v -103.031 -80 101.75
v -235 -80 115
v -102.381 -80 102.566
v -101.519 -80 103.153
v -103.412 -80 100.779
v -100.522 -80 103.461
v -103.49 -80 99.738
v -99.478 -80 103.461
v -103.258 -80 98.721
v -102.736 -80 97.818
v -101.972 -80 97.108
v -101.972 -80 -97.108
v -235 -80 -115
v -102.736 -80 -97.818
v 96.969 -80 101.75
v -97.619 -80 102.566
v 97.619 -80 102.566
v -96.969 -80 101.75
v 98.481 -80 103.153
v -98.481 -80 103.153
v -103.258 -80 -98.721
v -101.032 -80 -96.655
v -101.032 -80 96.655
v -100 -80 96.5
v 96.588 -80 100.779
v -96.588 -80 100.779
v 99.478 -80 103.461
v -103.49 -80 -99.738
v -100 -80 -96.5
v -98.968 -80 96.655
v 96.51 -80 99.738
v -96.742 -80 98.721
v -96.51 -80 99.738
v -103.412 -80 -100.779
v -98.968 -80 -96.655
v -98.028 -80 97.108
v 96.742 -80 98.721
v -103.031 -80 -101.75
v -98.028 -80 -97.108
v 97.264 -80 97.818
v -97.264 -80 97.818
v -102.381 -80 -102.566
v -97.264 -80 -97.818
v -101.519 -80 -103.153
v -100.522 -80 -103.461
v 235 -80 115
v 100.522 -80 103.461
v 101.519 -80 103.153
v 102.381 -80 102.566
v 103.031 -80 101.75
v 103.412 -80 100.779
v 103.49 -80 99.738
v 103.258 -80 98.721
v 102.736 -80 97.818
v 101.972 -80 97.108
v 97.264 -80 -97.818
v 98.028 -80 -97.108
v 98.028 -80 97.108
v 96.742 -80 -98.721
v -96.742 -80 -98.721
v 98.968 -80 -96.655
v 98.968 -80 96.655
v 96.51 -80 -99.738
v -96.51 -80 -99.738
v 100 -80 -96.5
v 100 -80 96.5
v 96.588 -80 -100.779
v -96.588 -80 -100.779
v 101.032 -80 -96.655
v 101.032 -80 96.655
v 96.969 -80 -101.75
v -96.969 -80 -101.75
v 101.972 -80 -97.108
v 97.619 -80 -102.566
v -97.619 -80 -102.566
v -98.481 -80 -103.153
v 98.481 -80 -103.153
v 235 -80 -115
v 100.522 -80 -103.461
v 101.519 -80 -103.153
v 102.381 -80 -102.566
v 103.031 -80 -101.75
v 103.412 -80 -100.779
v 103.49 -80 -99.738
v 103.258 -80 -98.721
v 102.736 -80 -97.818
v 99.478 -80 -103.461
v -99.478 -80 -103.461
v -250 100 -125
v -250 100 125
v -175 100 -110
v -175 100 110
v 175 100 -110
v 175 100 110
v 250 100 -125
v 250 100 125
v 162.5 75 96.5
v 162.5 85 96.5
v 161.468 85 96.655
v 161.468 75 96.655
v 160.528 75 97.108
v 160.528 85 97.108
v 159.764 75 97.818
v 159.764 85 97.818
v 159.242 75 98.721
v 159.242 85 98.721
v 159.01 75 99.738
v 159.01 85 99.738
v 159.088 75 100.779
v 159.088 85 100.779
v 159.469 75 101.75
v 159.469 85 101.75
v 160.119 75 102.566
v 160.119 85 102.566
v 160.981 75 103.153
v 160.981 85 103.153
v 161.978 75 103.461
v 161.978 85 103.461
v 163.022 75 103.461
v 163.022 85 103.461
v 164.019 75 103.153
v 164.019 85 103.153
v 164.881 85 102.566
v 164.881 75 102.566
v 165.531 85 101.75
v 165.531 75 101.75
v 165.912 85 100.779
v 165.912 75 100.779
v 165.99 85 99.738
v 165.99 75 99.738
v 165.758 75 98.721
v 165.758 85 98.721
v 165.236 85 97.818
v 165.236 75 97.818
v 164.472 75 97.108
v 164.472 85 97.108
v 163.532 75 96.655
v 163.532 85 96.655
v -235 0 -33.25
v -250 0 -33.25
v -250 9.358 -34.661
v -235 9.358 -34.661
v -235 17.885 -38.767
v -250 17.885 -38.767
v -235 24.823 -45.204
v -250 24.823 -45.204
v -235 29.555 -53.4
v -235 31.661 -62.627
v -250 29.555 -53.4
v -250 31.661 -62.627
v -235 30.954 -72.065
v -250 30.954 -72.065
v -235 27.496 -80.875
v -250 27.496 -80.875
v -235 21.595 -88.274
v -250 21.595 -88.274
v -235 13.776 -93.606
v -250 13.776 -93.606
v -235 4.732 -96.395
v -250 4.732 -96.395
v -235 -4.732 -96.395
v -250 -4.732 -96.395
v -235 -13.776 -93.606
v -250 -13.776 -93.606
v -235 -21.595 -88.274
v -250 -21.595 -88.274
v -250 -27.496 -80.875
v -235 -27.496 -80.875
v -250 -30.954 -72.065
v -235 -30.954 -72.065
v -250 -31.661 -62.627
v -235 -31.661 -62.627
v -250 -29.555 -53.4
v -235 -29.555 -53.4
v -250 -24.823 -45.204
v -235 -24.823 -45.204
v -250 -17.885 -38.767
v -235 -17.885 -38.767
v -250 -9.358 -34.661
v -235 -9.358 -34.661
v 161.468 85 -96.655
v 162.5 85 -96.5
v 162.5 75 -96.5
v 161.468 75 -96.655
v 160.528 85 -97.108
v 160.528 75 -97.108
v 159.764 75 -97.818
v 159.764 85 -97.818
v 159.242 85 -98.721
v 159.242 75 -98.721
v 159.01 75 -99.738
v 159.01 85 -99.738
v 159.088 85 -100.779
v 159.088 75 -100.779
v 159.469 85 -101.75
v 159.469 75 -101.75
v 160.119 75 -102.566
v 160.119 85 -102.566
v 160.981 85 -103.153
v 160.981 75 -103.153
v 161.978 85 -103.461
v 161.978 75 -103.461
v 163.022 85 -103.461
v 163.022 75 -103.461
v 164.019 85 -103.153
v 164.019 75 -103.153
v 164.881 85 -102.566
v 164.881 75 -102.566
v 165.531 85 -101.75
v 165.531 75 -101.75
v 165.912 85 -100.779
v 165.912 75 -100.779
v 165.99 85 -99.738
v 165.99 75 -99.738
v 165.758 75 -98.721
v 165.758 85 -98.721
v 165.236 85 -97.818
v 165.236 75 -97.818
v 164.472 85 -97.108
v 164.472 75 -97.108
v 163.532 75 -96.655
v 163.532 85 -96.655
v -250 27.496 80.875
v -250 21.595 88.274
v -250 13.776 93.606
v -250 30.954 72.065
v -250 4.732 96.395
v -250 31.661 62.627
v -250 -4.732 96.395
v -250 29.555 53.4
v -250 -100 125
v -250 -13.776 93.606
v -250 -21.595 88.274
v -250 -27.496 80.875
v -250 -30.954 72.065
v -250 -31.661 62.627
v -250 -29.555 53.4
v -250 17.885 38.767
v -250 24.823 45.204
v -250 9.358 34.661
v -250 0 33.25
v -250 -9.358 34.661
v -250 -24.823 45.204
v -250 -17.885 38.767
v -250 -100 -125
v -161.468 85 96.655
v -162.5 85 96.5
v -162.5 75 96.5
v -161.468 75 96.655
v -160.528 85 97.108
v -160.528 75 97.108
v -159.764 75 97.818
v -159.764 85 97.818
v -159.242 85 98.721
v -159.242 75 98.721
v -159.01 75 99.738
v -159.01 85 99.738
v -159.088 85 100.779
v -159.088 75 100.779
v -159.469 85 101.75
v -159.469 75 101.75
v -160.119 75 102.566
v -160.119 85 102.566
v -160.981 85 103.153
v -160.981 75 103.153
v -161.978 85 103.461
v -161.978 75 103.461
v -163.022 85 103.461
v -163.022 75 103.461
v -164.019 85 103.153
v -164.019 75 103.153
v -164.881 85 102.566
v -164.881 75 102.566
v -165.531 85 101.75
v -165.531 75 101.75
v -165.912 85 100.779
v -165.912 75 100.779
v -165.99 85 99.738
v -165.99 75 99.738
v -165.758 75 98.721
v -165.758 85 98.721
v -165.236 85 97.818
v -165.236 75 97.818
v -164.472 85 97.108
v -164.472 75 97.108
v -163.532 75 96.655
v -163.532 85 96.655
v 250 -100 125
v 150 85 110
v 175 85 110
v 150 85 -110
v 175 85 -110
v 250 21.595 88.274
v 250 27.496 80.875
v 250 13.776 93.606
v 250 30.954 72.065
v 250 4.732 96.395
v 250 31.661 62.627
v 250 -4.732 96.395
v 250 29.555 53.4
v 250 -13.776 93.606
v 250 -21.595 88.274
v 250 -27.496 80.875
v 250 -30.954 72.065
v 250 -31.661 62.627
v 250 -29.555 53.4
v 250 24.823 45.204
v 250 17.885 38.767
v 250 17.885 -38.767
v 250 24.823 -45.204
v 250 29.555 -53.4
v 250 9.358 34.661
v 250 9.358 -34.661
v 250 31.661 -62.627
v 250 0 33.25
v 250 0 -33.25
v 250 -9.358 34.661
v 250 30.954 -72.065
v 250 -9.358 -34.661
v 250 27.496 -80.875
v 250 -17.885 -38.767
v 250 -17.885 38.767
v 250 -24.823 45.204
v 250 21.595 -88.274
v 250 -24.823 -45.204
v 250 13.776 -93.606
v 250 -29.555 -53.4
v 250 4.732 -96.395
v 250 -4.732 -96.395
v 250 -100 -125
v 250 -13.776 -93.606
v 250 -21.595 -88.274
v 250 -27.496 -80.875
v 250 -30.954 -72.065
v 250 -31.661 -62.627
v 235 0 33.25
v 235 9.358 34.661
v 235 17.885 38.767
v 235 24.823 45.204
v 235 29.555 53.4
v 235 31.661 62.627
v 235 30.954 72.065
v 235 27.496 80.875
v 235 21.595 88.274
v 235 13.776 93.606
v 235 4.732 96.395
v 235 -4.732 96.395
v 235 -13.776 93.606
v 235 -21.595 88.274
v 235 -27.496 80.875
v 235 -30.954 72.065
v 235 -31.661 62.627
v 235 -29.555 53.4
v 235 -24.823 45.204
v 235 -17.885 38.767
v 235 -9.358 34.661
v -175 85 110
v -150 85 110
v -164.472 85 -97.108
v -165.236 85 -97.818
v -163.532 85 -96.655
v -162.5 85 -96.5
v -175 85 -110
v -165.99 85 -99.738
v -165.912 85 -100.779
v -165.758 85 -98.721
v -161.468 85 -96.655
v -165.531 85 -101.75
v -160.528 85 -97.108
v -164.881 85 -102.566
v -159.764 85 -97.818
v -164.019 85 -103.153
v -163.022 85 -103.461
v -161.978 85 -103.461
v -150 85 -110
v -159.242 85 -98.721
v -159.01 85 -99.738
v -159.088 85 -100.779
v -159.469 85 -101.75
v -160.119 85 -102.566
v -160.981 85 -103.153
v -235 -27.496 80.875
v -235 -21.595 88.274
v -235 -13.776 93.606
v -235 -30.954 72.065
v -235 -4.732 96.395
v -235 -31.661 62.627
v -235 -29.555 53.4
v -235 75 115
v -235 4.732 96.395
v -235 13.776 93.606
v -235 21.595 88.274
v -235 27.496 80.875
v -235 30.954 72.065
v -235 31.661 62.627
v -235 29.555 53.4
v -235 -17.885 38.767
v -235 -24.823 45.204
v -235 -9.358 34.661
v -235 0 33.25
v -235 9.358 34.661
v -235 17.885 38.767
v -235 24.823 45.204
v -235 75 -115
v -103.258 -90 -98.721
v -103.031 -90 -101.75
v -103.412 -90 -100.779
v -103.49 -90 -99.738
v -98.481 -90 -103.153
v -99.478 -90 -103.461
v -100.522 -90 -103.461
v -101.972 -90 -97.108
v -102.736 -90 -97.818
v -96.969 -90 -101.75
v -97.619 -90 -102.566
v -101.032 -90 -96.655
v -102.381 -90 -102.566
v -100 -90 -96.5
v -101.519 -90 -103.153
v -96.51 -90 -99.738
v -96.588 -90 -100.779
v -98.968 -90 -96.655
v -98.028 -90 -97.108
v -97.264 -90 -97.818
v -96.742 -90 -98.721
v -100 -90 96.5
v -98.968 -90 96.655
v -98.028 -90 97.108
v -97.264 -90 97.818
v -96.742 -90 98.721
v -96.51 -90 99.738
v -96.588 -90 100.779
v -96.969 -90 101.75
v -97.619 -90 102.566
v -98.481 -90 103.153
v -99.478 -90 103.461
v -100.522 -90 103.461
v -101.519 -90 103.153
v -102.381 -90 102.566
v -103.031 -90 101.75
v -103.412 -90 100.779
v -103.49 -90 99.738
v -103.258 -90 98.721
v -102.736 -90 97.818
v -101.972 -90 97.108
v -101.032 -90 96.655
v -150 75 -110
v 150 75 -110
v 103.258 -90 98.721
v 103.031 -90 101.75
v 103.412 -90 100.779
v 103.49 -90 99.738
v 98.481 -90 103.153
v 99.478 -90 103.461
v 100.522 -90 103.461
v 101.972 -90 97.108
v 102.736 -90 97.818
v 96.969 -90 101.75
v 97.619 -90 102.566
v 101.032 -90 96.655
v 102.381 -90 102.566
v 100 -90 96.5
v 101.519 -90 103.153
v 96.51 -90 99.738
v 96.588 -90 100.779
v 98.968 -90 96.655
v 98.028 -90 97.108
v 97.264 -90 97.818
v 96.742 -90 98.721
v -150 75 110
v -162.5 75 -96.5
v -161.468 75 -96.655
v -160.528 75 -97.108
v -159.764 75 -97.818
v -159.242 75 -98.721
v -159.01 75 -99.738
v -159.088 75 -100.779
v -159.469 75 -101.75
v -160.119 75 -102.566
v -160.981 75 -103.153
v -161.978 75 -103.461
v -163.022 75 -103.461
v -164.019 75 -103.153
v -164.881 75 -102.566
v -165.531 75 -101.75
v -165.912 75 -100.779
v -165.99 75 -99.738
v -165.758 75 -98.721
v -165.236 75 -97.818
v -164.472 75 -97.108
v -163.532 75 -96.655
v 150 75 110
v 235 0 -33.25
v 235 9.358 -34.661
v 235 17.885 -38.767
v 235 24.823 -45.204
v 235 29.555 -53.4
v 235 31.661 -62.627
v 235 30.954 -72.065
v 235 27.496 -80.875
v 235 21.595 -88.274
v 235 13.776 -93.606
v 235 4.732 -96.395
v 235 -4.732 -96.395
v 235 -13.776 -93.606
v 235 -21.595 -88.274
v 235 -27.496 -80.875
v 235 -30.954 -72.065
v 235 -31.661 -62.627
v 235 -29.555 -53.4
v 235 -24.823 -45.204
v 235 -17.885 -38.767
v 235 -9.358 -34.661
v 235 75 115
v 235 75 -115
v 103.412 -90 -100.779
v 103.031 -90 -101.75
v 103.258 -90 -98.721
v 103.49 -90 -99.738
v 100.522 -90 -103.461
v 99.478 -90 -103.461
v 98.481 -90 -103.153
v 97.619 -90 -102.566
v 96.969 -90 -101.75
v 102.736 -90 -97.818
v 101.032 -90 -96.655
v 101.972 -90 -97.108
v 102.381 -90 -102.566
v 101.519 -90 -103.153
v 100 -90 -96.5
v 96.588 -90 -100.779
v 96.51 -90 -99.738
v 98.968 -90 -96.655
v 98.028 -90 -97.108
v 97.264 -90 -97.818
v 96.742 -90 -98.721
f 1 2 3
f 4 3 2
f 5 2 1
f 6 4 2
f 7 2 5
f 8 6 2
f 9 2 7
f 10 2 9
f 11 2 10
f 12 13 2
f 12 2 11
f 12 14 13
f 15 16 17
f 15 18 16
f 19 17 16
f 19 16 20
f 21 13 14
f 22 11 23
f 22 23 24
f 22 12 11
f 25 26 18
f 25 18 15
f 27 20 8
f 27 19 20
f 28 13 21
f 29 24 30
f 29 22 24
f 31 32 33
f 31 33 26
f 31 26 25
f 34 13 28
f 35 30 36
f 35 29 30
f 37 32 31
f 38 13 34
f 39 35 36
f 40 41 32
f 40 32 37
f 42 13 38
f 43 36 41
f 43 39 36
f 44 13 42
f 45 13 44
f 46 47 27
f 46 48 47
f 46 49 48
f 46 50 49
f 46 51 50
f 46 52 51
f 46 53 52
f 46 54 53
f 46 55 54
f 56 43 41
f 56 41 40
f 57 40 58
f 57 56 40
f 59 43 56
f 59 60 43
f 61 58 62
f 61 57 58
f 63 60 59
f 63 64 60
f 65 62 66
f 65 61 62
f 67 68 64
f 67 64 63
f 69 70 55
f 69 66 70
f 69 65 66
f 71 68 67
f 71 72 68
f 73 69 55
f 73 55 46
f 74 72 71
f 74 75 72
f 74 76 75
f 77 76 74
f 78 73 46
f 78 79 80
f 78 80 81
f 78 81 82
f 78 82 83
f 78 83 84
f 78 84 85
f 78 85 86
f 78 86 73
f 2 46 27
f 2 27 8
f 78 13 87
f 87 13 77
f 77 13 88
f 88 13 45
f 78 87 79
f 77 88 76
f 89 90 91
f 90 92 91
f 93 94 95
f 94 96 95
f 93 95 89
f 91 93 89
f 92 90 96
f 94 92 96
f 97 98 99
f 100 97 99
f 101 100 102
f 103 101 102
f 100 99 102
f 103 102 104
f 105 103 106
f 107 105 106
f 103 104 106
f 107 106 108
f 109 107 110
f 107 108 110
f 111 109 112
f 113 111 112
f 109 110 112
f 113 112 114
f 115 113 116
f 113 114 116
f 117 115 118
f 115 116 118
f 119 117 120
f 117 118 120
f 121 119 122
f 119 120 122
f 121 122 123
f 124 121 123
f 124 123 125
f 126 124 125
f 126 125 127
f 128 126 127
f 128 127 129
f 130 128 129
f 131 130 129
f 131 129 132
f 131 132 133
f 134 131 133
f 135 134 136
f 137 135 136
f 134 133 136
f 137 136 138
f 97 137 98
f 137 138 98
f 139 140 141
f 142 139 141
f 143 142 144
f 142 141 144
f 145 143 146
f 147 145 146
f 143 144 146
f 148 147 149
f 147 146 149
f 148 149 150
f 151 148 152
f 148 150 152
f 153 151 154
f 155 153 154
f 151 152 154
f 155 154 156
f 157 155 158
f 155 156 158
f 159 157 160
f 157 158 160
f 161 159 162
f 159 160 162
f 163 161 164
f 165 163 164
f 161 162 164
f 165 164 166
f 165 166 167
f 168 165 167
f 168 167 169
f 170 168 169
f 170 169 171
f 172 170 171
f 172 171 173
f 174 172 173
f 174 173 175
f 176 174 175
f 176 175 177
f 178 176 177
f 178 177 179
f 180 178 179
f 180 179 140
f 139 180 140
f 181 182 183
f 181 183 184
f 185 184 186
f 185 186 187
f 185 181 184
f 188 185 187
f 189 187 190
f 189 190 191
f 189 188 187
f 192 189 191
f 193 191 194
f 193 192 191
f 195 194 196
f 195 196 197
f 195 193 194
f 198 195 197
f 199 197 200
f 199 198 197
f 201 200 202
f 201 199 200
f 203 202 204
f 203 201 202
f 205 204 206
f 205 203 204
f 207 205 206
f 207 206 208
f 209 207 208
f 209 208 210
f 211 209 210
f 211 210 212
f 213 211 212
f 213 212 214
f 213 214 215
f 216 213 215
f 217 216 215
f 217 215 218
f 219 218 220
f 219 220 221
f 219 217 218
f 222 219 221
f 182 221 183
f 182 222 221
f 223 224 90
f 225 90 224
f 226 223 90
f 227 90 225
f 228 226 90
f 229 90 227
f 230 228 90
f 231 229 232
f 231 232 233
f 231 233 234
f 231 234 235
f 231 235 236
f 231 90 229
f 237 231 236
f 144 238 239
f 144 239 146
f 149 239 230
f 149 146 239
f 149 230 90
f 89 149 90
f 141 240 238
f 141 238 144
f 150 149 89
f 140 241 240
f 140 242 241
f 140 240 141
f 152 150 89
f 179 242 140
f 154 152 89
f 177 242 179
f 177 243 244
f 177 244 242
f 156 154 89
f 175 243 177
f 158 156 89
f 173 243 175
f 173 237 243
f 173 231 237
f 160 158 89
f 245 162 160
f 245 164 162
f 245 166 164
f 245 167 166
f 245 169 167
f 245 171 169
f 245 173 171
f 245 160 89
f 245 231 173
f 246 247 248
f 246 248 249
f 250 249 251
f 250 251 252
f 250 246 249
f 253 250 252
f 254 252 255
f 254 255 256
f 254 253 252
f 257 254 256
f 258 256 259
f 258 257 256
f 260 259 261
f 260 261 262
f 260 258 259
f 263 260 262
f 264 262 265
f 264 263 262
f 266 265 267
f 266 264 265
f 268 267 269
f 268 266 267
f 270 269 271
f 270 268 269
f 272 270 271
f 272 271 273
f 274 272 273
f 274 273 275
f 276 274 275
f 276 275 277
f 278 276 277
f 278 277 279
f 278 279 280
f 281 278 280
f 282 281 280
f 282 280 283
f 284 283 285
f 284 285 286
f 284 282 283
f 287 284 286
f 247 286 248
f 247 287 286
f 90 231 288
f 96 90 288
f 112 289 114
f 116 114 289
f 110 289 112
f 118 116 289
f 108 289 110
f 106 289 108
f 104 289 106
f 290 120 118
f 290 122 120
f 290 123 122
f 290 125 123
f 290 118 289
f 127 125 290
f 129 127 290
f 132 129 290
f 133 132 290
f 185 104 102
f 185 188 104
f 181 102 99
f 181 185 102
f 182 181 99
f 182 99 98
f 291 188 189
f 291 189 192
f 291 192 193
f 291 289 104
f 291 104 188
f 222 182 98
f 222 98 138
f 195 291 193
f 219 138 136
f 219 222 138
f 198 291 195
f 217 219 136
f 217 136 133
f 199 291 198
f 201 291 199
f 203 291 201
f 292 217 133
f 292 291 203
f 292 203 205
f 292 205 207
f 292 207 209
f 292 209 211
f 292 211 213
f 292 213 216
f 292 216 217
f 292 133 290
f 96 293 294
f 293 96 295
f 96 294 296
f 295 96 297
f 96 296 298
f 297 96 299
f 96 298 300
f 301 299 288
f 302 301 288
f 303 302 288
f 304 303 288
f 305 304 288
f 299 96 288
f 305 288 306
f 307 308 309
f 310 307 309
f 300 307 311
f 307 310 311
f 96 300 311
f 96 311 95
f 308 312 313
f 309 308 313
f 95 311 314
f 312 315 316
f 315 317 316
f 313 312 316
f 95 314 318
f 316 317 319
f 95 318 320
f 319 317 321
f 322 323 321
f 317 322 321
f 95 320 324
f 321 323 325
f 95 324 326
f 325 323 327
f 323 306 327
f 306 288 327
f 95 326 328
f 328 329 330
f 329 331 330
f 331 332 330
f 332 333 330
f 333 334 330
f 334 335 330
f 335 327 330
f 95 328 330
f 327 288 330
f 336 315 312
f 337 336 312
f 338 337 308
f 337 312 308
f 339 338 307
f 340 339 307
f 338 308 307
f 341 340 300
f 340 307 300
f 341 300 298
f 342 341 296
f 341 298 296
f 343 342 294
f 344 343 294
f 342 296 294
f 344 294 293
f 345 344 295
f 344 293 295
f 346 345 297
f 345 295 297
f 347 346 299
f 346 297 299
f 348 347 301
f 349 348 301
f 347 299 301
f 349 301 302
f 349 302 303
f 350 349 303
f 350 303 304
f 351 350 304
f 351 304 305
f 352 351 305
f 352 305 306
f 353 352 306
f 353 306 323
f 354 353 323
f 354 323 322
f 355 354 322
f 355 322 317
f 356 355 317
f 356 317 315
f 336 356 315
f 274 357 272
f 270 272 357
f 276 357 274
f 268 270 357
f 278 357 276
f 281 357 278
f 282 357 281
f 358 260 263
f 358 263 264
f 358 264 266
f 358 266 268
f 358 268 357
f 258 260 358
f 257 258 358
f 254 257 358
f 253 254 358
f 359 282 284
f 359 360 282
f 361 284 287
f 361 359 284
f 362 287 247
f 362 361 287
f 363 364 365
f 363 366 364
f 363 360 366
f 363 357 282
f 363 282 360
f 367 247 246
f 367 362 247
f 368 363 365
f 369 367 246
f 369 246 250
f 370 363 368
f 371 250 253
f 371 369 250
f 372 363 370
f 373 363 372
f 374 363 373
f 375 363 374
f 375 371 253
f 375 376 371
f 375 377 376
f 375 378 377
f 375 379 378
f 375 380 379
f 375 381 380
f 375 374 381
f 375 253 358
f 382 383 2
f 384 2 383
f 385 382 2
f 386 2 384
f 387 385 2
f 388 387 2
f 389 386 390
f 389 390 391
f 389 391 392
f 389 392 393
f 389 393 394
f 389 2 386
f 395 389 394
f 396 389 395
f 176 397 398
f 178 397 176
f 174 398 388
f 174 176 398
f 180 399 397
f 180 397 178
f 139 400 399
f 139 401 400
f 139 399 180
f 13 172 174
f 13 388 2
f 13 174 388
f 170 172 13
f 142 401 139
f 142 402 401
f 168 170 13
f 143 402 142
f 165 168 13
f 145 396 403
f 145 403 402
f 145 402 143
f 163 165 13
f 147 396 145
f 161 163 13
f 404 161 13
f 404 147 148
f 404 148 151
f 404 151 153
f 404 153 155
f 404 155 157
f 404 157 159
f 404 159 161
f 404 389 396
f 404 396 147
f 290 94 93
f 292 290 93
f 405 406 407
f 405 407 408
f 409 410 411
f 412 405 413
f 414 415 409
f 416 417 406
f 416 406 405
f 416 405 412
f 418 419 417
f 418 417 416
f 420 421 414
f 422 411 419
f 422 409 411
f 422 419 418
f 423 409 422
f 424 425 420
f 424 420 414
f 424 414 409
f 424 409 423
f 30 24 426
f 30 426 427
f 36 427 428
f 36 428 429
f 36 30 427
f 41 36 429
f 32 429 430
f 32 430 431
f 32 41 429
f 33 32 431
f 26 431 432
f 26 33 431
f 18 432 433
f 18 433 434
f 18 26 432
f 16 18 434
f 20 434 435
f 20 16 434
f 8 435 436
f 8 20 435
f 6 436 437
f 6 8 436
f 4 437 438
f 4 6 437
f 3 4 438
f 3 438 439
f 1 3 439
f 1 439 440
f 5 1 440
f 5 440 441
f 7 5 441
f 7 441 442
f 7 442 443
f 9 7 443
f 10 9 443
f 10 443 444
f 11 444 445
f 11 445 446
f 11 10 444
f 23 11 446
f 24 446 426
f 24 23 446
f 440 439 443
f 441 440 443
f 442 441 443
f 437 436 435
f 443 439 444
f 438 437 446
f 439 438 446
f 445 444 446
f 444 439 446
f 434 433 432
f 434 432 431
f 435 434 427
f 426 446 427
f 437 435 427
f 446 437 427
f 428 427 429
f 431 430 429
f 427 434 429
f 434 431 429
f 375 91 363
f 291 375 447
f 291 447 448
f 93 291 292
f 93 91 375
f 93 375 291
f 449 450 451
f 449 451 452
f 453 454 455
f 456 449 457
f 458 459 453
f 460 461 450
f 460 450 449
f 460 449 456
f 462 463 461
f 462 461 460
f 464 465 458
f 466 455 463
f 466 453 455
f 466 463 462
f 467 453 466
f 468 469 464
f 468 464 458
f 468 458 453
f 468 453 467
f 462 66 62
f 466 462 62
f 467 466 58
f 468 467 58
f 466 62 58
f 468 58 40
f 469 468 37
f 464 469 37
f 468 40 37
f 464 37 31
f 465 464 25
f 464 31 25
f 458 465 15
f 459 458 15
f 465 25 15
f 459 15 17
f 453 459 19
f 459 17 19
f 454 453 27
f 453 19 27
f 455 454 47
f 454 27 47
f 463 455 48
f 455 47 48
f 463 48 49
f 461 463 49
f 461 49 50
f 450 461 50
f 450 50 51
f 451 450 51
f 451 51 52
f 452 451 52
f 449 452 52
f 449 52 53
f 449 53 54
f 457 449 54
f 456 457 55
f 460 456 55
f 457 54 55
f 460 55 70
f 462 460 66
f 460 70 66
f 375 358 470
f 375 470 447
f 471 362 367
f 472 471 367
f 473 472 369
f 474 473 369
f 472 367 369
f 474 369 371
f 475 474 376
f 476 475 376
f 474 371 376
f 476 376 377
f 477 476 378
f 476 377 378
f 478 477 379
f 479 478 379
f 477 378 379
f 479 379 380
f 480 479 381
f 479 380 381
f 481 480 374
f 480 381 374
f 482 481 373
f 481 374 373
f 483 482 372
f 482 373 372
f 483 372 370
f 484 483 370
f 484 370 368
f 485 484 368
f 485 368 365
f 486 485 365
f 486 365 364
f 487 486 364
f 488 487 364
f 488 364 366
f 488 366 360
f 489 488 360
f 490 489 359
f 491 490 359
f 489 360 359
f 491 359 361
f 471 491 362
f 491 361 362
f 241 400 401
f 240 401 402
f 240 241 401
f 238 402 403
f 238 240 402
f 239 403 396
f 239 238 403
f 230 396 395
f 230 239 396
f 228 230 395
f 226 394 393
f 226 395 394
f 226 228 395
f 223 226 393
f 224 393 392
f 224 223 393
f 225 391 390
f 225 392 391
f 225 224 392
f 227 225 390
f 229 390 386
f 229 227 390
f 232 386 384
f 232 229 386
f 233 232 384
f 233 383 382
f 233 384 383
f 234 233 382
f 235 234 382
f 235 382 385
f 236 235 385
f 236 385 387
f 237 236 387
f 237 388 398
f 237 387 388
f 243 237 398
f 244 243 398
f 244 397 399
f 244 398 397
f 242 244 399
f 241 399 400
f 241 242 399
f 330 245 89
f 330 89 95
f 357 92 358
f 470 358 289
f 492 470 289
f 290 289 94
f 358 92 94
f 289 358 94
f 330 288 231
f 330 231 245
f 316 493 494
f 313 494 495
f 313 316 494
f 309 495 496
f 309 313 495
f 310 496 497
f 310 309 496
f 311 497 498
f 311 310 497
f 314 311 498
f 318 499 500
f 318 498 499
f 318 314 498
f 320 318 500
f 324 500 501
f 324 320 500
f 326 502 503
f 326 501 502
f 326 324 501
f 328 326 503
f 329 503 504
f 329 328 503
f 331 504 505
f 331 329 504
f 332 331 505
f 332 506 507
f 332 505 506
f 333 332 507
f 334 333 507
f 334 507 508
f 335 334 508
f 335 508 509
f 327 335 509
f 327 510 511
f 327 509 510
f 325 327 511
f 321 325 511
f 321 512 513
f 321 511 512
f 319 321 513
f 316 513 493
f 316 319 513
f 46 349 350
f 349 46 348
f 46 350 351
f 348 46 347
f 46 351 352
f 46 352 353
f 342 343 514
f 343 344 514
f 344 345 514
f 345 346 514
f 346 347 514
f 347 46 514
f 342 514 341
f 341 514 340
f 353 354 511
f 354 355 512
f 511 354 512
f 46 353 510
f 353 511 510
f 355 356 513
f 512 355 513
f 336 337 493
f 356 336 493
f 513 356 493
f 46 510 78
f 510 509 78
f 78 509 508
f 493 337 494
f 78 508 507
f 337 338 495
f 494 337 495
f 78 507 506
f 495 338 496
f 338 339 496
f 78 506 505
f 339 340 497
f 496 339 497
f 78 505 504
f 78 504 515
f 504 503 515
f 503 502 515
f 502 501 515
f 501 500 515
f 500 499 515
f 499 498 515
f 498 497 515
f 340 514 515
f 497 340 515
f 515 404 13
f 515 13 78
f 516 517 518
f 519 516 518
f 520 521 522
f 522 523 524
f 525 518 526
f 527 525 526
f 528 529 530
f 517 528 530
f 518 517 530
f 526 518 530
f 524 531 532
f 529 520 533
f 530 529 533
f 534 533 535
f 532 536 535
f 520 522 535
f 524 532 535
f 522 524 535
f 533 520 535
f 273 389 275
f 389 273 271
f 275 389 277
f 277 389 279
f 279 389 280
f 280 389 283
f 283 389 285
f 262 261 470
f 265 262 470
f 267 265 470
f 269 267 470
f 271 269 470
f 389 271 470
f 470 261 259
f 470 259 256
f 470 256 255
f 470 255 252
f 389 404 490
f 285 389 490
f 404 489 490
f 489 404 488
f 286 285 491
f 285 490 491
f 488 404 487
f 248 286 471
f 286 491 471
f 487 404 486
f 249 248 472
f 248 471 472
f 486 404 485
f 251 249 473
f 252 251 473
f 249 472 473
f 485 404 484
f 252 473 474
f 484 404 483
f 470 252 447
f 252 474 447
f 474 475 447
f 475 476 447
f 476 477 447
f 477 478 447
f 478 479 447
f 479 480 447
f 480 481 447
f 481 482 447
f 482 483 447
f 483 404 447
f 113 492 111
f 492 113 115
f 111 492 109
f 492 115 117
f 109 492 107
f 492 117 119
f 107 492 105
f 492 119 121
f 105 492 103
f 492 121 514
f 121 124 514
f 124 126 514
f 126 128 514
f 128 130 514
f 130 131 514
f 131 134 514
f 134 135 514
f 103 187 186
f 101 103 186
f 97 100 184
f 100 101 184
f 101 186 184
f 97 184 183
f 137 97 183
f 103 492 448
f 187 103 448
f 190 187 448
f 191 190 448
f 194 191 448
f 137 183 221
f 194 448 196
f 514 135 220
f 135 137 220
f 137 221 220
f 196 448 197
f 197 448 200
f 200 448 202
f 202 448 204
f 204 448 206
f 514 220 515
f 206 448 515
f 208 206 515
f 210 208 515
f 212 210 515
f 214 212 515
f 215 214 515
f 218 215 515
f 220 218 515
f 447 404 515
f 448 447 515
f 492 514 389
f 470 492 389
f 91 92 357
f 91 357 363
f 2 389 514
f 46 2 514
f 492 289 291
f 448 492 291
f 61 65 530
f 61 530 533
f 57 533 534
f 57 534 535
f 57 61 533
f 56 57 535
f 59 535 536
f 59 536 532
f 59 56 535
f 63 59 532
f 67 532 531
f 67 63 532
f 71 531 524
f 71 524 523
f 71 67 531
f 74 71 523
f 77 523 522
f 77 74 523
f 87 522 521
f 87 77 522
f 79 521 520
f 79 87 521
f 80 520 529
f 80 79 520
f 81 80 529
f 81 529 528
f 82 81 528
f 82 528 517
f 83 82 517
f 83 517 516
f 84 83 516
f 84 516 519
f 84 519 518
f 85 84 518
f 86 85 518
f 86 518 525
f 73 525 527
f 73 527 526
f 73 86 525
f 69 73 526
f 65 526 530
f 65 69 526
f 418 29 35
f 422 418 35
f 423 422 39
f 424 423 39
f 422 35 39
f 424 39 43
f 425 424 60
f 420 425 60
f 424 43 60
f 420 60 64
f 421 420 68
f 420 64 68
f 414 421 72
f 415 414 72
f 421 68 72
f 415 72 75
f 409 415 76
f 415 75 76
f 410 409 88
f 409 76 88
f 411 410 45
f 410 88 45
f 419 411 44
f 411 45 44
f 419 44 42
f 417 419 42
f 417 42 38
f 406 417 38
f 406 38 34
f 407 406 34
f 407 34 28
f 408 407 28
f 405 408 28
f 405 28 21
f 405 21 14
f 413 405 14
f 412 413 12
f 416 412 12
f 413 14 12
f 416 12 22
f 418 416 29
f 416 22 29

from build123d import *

# Parameters (mm, degrees)
SKETCH1_W                = 250
SKETCH1_H                = 200
BOSS_EXTRUDE1_DEPTH      = 250
SKETCH7_W                = 470
SKETCH7_H                = 230
CUT_EXTRUDE4_DEPTH       = 80
SKETCH5_R                = 31.75
F_63_5MM_DIA_SERVO_DEPTH = 20
MIRROR13_COPY_1_SKETCH_R = 31.75
MIRROR13_COPY_1_DEPTH    = 20
SKETCH10_W               = 350
SKETCH10_H               = 220
CUT_EXTRUDE5_DEPTH       = 20
SKETCH15_W               = 500
SKETCH15_H               = 250
BOSS_EXTRUDE2_DEPTH      = 10
SKETCH18_W               = 300
SKETCH18_H               = 220
CUT_EXTRUDE11_DEPTH      = 10
SKETCH19_R               = 3.5
CUT_EXTRUDE12_DEPTH      = 10
MIRROR15_COPY_1_SKETCH_R = 3.5
MIRROR15_COPY_1_DEPTH    = 10
SKETCH20_R               = 3.5
CUT_EXTRUDE13_DEPTH      = 10
MIRROR17_COPY_1_SKETCH_R = 3.5
MIRROR17_COPY_1_DEPTH    = 10


with BuildPart() as part:
    # Sketch1 → Boss-Extrude1 (new, symmetric)
    with BuildSketch(Plane(origin=(0, 0, 0), x_dir=(0, 0, -1), z_dir=(1, 0, 0))):
        Rectangle(SKETCH1_W, SKETCH1_H)
    extrude(amount=BOSS_EXTRUDE1_DEPTH, both=True)

    # Sketch7 → Cut-Extrude4 (cut, symmetric)
    with BuildSketch(Plane(origin=(0, 0, 0), x_dir=(1, 0, 0), z_dir=(0, 1, 0))):
        Rectangle(SKETCH7_W, SKETCH7_H)
    extrude(amount=CUT_EXTRUDE4_DEPTH, both=True, mode=Mode.SUBTRACT)

    # Sketch5 → 63.5mm_dia_servo (cut)
    with BuildSketch(Plane(origin=(250, 0, 0), x_dir=(0, 0, -1), z_dir=(1, 0, 0))):
        with Locations((-65, 0)):
            Circle(SKETCH5_R)
    f_63_5mm_dia_servo = extrude(amount=-F_63_5MM_DIA_SERVO_DEPTH, mode=Mode.SUBTRACT)

    # Mirror12: 63.5mm_dia_servo across plane
    add(f_63_5mm_dia_servo.mirror(Plane.XY), mode=Mode.SUBTRACT)

    # Mirror13: 63.5mm_dia_servo across plane
    add(f_63_5mm_dia_servo.mirror(Plane(origin=(0, 0, 0), x_dir=(0, 0, 1), z_dir=(1, 0, 0))), mode=Mode.SUBTRACT)

    # Mirror13 copy 1 sketch → Mirror13 copy 1 (cut)
    with BuildSketch(Plane.ZY.offset(250)):
        with Locations((-65, 0)):
            Circle(MIRROR13_COPY_1_SKETCH_R)
    extrude(amount=-MIRROR13_COPY_1_DEPTH, mode=Mode.SUBTRACT)

    # Sketch10 → Cut-Extrude5 (cut)
    with BuildSketch(Plane(origin=(0, 100, 0), x_dir=(1, 0, 0), z_dir=(0, 1, 0))):
        Rectangle(SKETCH10_W, SKETCH10_H)
    extrude(amount=-CUT_EXTRUDE5_DEPTH, mode=Mode.SUBTRACT)

    # Sketch15 → Boss-Extrude2 (add)
    with BuildSketch(Plane(origin=(0, 75, 0), x_dir=(1, 0, 0), z_dir=(0, 1, 0))):
        Rectangle(SKETCH15_W, SKETCH15_H)
    extrude(amount=BOSS_EXTRUDE2_DEPTH)

    # Sketch18 → Cut-Extrude11 (cut)
    with BuildSketch(Plane(origin=(0, 85, 0), x_dir=(1, 0, 0), z_dir=(0, 1, 0))):
        Rectangle(SKETCH18_W, SKETCH18_H)
    extrude(amount=-CUT_EXTRUDE11_DEPTH, mode=Mode.SUBTRACT)

    # Sketch19 → Cut-Extrude12 (cut)
    with BuildSketch(Plane(origin=(0, 85, 0), x_dir=(1, 0, 0), z_dir=(0, 1, 0))):
        with Locations(Location((-162.5, 100, 0), (0, 0, 270))):
            Circle(SKETCH19_R)
    cut_extrude12 = extrude(amount=-CUT_EXTRUDE12_DEPTH, mode=Mode.SUBTRACT)

    # Mirror14: Cut-Extrude12 across plane
    add(cut_extrude12.mirror(Plane.XY), mode=Mode.SUBTRACT)

    # Mirror15: Cut-Extrude12 across plane
    add(cut_extrude12.mirror(Plane(origin=(0, 0, 0), x_dir=(0, 0, 1), z_dir=(1, 0, 0))), mode=Mode.SUBTRACT)

    # Mirror15 copy 1 sketch → Mirror15 copy 1 (cut)
    with BuildSketch(Plane(origin=(0, 85, 0), x_dir=(-1, 0, 0), z_dir=(0, 1, 0))):
        with Locations(Location((-162.5, 100, 0), (0, 0, 270))):
            Circle(MIRROR15_COPY_1_SKETCH_R)
    extrude(amount=-MIRROR15_COPY_1_DEPTH, mode=Mode.SUBTRACT)

    # Sketch20 → Cut-Extrude13 (cut)
    with BuildSketch(Plane(origin=(0, -80, 0), x_dir=(1, 0, 0), z_dir=(0, 1, 0))):
        with Locations(Location((-100, 100, 0), (0, 0, 270))):
            Circle(SKETCH20_R)
    cut_extrude13 = extrude(amount=-CUT_EXTRUDE13_DEPTH, mode=Mode.SUBTRACT)

    # Mirror16: Cut-Extrude13 across plane
    add(cut_extrude13.mirror(Plane.XY), mode=Mode.SUBTRACT)

    # Mirror17: Cut-Extrude13 across plane
    add(cut_extrude13.mirror(Plane(origin=(0, 0, 0), x_dir=(0, 0, 1), z_dir=(1, 0, 0))), mode=Mode.SUBTRACT)

    # Mirror17 copy 1 sketch → Mirror17 copy 1 (cut)
    with BuildSketch(Plane(origin=(0, -80, 0), x_dir=(-1, 0, 0), z_dir=(0, 1, 0))):
        with Locations(Location((-100, 100, 0), (0, 0, 270))):
            Circle(MIRROR17_COPY_1_SKETCH_R)
    extrude(amount=-MIRROR17_COPY_1_DEPTH, mode=Mode.SUBTRACT)


solid = part.part
